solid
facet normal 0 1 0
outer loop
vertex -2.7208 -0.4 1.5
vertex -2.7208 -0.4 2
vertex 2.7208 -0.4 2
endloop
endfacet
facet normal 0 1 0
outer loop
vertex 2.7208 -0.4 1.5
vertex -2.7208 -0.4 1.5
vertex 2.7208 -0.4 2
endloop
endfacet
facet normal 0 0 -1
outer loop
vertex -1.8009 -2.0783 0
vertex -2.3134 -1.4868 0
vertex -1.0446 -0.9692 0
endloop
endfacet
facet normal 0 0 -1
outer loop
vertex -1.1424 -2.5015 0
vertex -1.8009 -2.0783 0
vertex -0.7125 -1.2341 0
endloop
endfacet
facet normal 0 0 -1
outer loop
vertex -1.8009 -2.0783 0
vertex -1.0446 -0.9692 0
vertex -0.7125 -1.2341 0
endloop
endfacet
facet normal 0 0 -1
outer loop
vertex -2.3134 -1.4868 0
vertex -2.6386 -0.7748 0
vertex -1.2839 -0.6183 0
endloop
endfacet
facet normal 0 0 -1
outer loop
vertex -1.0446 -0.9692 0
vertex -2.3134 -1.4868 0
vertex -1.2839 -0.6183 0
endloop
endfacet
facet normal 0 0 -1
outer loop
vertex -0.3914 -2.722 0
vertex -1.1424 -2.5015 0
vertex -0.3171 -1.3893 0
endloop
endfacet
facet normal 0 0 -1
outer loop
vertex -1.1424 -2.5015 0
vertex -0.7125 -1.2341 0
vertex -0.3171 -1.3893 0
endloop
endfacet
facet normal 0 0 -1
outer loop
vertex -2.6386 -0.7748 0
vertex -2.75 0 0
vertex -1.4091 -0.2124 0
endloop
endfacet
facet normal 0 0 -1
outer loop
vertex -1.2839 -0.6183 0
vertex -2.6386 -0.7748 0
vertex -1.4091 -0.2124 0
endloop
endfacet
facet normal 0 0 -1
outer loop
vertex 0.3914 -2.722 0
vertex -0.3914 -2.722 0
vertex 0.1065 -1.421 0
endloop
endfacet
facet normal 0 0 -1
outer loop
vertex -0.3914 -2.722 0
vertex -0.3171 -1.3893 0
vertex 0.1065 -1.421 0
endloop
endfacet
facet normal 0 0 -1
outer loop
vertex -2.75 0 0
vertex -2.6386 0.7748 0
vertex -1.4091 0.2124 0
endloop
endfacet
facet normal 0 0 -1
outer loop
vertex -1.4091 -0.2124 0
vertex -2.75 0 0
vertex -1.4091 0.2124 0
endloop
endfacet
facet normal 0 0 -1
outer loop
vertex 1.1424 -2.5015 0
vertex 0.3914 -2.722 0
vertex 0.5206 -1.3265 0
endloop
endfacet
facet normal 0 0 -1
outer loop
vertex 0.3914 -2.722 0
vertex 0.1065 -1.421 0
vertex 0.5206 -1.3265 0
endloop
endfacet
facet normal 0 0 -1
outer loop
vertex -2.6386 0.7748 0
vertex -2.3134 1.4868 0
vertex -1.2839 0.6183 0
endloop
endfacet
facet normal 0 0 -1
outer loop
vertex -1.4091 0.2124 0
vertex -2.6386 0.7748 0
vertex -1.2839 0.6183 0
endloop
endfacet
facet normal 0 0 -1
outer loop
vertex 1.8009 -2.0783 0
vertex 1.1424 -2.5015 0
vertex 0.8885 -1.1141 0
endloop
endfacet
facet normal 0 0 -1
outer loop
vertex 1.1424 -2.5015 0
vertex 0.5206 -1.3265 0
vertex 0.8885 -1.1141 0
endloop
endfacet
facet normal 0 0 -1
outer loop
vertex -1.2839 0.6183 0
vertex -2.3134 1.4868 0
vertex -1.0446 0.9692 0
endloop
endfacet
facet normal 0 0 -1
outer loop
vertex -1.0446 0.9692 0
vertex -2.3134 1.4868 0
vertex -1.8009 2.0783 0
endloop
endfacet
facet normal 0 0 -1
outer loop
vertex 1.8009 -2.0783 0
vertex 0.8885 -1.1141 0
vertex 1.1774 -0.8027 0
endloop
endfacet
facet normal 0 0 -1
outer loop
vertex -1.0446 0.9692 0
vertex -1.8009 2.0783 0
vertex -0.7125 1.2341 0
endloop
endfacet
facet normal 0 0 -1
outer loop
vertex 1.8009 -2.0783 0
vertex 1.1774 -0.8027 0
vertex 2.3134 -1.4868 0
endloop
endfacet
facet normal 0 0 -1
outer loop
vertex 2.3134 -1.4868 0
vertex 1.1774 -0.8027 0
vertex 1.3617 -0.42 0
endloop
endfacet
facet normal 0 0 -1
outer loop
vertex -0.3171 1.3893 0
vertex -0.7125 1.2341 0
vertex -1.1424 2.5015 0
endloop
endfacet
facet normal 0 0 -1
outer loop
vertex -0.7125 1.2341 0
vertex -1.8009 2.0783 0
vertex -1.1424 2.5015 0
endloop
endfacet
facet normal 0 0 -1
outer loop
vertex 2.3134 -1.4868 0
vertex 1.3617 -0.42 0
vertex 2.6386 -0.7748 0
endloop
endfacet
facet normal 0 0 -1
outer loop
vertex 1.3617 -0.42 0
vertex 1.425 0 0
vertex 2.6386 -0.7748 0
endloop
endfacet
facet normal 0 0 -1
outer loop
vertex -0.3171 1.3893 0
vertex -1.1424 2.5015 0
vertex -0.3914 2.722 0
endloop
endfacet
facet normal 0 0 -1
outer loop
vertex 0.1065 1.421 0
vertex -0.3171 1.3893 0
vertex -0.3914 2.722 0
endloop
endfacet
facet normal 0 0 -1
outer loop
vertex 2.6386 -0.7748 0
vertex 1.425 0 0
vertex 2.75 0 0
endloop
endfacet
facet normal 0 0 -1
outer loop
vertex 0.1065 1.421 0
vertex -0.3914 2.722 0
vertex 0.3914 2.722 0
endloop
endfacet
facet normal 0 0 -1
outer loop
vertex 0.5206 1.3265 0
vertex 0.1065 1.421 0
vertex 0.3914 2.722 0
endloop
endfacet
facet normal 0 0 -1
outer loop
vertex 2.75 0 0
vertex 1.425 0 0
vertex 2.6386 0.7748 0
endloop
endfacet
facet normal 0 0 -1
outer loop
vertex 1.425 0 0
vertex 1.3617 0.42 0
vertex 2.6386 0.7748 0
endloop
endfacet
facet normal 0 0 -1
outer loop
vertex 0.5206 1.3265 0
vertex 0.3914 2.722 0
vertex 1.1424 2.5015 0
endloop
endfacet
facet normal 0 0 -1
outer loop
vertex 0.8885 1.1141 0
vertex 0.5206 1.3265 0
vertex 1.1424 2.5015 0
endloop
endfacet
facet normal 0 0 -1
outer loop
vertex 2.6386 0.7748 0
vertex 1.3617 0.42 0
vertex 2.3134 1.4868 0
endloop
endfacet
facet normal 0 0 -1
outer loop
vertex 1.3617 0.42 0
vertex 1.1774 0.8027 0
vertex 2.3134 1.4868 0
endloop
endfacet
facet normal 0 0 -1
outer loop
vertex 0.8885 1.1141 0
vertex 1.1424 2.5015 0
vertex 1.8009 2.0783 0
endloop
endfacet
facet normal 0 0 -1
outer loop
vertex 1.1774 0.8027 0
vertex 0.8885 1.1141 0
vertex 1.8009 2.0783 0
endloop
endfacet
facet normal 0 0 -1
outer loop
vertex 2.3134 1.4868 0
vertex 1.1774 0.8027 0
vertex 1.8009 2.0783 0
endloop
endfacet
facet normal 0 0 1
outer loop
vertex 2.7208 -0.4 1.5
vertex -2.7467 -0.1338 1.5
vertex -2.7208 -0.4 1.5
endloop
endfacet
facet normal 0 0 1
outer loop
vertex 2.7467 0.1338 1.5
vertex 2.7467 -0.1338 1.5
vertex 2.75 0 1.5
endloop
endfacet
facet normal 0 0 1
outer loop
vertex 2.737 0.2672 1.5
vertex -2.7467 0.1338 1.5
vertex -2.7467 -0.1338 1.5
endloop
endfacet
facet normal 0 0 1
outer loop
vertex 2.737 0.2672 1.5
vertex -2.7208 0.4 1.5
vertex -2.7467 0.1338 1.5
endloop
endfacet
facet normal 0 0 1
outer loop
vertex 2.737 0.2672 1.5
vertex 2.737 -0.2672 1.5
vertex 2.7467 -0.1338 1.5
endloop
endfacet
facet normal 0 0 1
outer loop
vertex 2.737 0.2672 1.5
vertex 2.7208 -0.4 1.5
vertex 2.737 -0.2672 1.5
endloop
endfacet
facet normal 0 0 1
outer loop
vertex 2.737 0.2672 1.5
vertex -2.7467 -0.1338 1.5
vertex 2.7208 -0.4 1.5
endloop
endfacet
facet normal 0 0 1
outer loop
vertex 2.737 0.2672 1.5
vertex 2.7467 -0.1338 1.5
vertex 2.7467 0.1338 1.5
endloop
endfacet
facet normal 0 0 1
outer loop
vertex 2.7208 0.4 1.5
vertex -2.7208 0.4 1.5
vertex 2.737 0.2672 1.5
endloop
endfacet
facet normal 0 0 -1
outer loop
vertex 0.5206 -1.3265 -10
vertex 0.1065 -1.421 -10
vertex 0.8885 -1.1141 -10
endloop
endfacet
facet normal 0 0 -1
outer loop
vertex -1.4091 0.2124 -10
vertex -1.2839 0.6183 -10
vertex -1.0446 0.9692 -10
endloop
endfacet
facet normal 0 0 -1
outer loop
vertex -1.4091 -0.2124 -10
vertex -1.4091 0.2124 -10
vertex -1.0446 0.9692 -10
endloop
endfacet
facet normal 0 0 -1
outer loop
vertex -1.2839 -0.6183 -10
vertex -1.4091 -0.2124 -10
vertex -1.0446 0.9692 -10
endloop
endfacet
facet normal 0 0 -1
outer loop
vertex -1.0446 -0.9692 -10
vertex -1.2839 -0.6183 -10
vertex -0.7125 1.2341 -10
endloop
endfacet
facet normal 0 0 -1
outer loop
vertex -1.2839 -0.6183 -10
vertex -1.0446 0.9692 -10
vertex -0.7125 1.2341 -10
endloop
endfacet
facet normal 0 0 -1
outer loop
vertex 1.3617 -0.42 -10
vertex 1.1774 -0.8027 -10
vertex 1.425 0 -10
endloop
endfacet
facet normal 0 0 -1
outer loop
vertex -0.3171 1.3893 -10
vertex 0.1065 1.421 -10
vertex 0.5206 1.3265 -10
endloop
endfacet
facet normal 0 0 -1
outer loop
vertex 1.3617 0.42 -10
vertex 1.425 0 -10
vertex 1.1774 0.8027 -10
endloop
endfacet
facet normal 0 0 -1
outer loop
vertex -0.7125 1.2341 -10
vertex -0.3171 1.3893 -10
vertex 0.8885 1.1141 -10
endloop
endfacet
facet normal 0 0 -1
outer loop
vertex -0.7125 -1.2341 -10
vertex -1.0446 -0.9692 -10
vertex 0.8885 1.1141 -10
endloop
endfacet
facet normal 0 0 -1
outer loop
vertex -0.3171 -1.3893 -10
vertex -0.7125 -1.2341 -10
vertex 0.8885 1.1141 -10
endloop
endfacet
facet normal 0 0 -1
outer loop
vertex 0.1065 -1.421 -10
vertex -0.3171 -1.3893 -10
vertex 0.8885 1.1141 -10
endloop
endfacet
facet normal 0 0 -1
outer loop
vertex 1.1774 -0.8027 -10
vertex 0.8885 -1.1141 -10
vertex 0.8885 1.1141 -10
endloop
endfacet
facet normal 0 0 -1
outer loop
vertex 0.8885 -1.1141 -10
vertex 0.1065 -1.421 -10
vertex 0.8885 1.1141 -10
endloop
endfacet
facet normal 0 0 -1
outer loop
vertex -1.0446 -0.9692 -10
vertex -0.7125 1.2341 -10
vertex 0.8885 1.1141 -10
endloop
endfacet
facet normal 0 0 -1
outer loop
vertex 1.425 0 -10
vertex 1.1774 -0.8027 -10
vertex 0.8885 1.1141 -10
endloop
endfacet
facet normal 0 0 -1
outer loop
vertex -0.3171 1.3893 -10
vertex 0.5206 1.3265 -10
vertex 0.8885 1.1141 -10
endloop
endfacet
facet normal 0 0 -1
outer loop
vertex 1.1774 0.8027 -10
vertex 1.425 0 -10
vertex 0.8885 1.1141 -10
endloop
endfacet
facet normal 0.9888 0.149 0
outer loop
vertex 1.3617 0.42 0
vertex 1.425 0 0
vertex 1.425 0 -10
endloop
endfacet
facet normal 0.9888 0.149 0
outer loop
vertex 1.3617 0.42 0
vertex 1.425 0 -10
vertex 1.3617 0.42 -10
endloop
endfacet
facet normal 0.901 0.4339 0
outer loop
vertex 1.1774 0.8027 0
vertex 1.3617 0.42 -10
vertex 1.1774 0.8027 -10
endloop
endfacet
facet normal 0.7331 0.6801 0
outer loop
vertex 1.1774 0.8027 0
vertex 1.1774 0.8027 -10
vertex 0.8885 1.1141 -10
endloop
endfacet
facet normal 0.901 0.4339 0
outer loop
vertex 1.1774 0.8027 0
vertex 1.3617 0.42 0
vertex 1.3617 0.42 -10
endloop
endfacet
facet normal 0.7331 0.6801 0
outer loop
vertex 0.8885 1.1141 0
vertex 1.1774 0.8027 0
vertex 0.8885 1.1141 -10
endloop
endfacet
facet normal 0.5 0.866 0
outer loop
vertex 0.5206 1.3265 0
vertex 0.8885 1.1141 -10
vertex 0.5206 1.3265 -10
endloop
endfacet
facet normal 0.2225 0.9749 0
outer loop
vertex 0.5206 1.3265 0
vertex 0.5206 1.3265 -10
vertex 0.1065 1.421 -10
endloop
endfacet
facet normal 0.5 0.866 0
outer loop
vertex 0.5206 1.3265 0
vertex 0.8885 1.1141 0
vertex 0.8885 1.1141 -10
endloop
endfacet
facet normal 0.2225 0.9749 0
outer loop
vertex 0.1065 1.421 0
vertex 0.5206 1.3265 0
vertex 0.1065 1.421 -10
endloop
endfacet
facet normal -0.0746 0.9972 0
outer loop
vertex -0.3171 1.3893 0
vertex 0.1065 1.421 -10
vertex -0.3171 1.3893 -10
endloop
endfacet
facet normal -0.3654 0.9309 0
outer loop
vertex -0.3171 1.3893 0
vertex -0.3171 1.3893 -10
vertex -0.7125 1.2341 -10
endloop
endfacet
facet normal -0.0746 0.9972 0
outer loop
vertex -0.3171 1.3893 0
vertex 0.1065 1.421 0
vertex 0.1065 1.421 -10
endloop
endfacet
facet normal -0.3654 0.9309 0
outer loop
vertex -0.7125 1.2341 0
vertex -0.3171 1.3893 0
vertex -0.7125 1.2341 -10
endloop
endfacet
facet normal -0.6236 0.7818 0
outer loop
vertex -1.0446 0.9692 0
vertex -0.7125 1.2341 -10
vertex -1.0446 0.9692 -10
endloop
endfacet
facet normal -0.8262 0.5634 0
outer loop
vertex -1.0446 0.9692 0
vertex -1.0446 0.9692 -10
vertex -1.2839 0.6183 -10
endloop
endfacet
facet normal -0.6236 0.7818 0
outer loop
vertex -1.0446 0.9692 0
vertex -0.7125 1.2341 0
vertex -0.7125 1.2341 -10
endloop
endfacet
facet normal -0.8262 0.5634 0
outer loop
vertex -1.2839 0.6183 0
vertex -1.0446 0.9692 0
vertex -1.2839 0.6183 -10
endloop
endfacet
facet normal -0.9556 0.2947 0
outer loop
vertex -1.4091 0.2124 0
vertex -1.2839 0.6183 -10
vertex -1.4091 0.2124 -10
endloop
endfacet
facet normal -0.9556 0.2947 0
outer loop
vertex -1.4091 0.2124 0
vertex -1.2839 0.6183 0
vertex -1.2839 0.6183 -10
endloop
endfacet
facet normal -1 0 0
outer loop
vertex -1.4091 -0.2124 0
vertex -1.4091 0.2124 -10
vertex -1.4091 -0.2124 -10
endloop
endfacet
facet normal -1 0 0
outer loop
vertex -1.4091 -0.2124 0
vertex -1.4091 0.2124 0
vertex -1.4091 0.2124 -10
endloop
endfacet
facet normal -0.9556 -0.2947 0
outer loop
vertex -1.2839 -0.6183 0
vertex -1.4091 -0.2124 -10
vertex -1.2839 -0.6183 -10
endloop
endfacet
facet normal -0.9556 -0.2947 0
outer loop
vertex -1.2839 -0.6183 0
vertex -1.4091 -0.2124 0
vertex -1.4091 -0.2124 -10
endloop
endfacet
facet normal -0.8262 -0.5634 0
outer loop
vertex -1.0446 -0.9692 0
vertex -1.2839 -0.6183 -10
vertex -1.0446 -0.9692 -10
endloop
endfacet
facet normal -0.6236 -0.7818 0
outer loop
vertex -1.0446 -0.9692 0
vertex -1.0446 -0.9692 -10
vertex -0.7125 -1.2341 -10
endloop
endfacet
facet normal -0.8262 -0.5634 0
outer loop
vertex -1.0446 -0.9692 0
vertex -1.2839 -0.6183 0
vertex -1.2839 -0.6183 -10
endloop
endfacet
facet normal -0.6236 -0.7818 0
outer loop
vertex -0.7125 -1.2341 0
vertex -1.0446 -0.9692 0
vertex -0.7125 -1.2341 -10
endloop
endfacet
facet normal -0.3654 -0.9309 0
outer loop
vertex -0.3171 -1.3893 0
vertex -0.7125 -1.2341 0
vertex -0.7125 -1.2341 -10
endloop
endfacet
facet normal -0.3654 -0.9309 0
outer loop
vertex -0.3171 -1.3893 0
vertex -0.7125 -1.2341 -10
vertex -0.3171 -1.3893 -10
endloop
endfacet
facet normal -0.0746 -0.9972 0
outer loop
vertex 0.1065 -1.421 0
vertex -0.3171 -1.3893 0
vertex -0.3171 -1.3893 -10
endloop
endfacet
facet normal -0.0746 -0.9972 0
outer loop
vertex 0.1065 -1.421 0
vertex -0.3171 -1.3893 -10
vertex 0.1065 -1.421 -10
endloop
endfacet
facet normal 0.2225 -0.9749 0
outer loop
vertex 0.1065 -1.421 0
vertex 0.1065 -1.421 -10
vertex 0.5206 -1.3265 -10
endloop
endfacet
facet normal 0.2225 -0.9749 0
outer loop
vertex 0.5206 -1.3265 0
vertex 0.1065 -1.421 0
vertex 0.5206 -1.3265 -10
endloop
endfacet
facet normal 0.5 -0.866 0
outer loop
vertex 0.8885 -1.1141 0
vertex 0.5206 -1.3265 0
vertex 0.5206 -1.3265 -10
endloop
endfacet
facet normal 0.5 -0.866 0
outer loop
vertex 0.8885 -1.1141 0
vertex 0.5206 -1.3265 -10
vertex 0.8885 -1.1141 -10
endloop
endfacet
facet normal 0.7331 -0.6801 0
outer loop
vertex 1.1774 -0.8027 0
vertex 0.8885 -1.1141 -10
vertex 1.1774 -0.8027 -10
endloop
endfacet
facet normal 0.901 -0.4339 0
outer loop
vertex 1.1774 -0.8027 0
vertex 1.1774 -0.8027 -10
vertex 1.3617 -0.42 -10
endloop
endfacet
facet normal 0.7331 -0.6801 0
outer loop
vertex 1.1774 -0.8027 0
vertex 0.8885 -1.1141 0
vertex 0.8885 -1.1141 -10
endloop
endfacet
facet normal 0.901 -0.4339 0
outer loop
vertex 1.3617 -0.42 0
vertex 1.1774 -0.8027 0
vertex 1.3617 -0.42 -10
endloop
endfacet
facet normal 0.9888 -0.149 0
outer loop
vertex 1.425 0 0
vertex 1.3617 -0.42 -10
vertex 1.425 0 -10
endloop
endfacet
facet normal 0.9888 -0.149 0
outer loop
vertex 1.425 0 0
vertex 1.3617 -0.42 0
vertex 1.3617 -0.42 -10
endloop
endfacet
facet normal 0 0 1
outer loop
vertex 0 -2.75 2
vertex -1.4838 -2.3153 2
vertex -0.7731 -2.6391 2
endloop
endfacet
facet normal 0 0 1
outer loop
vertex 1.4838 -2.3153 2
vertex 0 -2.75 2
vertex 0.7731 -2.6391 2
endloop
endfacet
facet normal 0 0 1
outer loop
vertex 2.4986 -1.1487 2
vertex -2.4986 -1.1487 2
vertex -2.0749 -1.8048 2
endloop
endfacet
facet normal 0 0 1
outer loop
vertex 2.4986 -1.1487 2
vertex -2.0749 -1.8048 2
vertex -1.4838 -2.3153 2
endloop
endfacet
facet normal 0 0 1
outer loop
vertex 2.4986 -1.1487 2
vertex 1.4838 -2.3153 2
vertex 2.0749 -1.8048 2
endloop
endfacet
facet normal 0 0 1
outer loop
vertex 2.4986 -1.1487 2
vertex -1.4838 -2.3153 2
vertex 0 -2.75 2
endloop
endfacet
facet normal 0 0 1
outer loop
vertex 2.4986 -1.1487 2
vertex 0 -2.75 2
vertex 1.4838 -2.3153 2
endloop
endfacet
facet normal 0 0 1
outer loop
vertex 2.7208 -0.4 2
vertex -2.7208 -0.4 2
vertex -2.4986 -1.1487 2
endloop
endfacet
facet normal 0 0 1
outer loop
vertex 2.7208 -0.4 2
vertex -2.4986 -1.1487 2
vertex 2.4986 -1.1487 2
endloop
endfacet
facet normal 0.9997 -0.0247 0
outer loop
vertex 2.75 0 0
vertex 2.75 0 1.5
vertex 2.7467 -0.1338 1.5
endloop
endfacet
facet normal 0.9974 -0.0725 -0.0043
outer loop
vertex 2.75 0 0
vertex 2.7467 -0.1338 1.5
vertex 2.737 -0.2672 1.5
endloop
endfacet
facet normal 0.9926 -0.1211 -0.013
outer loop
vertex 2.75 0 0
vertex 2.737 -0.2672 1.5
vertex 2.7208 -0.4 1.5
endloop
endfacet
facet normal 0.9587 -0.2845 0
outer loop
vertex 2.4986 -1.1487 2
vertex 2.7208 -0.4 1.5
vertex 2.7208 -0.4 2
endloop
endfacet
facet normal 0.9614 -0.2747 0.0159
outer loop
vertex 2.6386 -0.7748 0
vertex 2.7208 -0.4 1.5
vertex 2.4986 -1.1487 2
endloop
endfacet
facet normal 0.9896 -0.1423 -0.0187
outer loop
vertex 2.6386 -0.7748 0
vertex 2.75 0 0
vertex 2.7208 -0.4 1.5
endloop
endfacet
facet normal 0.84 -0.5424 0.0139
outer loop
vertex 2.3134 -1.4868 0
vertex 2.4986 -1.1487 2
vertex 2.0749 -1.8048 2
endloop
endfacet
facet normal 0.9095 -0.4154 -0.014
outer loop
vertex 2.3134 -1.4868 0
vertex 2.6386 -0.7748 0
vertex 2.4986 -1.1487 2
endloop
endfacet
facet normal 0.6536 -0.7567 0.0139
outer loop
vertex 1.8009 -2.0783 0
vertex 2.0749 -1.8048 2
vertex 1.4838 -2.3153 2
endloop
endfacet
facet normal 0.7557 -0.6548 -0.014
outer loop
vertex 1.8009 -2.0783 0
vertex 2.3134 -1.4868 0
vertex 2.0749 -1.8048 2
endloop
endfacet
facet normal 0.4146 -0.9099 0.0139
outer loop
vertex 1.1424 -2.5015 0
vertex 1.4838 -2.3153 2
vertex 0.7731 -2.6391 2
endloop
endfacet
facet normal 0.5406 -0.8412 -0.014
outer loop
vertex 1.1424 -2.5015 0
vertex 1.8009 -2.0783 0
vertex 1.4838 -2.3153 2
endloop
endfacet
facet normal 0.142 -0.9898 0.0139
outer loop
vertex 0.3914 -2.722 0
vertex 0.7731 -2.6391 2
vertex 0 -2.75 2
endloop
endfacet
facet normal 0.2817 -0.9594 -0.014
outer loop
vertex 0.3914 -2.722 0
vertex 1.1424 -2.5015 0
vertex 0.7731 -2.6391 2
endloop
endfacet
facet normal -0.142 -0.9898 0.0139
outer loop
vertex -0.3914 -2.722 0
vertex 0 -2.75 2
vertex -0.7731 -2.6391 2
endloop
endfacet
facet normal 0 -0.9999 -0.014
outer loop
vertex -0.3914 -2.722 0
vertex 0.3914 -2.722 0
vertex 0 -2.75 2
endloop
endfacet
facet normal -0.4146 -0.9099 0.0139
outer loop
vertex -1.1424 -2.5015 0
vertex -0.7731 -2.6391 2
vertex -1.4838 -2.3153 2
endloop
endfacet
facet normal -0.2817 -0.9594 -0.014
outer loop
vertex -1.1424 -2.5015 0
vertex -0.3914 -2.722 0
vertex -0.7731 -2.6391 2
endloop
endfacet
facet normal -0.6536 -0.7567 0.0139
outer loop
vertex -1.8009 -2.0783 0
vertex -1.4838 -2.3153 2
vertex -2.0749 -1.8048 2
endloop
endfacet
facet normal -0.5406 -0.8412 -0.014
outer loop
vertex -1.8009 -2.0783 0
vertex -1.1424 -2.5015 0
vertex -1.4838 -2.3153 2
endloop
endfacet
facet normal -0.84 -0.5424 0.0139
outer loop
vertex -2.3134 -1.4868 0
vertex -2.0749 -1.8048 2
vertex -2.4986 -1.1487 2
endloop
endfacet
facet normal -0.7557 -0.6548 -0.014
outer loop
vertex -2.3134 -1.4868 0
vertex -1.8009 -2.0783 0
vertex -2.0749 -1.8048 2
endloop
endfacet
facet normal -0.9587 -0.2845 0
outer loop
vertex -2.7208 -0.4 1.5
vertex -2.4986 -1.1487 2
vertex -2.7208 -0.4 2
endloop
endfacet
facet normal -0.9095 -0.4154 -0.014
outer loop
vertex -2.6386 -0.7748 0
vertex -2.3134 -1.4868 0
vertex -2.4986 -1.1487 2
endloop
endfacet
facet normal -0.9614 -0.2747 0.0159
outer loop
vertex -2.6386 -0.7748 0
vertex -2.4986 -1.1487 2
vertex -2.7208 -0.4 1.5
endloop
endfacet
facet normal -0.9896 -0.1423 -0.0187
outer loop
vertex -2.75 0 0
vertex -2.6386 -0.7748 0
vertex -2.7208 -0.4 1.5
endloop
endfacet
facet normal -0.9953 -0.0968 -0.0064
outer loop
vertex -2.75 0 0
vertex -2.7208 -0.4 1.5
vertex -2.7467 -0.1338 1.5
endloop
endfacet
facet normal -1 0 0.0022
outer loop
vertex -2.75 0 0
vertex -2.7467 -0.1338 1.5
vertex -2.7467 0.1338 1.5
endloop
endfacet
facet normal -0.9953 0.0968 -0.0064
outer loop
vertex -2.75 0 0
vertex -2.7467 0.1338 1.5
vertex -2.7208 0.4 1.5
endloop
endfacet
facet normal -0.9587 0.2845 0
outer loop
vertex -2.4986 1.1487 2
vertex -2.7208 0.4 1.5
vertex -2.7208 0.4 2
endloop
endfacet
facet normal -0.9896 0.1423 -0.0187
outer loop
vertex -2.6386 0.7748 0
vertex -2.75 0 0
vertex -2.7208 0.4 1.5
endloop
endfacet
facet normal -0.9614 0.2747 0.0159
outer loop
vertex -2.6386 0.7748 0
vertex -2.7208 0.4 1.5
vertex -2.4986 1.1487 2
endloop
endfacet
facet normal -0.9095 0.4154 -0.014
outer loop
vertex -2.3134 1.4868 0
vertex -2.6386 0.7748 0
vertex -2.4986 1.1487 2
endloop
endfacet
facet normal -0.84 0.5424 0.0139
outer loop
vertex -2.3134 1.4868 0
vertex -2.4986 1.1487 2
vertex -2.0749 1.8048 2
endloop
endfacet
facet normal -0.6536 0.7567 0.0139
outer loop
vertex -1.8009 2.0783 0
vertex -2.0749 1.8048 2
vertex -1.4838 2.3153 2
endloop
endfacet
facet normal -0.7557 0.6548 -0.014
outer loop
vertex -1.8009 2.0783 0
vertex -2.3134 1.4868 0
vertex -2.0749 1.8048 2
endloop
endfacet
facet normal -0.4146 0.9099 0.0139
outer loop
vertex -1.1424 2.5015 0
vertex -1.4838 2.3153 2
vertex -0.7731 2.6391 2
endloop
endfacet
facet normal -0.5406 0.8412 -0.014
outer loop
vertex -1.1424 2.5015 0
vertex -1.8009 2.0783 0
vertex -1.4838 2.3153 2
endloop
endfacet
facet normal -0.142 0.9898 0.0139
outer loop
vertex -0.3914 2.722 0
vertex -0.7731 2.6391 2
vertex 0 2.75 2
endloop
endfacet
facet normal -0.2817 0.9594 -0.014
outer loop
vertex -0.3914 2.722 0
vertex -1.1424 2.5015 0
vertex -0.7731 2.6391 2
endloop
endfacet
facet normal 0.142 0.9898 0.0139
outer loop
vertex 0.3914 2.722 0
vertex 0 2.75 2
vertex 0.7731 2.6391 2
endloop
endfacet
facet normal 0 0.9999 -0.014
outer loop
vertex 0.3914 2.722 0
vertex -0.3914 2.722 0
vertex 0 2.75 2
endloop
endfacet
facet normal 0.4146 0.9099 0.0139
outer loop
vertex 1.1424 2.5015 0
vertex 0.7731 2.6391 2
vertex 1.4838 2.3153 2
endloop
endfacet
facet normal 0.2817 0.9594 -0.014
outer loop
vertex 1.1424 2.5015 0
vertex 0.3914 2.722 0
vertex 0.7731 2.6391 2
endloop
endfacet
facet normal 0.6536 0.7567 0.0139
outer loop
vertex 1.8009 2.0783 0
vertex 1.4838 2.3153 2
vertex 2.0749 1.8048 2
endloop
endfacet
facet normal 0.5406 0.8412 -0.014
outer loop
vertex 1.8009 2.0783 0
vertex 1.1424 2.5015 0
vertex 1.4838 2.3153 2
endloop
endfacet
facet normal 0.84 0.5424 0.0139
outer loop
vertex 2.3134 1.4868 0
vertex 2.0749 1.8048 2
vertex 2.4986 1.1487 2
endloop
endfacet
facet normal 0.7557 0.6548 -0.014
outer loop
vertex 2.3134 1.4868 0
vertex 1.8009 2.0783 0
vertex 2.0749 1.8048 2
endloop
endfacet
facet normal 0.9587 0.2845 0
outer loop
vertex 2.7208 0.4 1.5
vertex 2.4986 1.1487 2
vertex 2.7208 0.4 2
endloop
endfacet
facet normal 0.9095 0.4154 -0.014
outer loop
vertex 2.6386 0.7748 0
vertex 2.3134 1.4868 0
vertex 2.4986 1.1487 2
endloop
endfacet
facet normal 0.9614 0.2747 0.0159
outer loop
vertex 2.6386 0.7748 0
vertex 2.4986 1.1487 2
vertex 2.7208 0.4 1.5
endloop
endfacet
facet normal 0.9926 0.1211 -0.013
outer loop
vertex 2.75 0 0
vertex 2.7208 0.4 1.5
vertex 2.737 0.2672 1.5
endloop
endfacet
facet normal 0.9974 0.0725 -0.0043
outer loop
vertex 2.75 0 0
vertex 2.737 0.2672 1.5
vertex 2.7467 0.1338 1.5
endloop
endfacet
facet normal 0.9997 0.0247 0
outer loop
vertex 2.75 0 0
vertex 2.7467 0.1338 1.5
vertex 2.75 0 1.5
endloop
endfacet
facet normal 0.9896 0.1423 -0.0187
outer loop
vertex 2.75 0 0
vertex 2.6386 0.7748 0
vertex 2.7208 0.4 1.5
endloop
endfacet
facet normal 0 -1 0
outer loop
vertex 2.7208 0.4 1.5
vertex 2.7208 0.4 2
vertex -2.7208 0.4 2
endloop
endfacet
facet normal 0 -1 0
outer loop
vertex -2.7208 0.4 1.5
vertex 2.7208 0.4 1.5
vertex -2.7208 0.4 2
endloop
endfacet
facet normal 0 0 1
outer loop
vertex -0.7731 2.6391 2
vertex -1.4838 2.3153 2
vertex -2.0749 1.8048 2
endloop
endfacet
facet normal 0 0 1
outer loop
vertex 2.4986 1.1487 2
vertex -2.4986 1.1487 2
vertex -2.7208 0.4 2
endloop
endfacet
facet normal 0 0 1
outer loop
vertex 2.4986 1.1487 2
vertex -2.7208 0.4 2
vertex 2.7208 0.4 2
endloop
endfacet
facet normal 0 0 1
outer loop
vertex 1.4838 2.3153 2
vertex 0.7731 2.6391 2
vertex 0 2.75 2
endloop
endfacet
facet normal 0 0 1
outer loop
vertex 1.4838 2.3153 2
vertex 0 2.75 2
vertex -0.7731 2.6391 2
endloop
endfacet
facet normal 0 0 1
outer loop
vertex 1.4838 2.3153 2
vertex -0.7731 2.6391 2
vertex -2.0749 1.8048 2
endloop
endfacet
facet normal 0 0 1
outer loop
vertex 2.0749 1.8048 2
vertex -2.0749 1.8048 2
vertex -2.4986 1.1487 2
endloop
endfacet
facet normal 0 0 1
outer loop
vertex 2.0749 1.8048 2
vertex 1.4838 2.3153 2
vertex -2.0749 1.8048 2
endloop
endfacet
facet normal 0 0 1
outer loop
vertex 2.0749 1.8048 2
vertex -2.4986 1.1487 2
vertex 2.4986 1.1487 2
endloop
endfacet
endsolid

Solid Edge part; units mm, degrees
sketch "Sketch1" plane through (0, 0, 0) normal (0, 0, 1) x (1, 0, 0)
  circle A0 centre (0, 0) radius 1.425
extrude "Protrusion1" add sketch "Sketch1" against normal blind 10
sketch "Sketch2" plane through (0, 0, 0) normal (0, 0, 1) x (1, 0, 0)
  circle A0 centre (0, 0) radius 2.75
extrude "ExtrudedProtrusion_2" add sketch "Sketch2" along normal blind 2
sketch "Sketch3" plane through (0, 0, 2) normal (0, 0, 1) x (1, 0, 0)
  line L0 (3.6964, 0.4) -> (-3.6964, 0.4)
  line L1 (-3.6964, 0.4) -> (-3.6964, -0.4)
  line L2 (-3.6964, -0.4) -> (3.6964, -0.4)
  line L3 (3.6964, -0.4) -> (3.6964, 0.4)
extrude "ExtrudedCutout_1" cut sketch "Sketch3" against normal blind 0.5
properties material "Graphite"
